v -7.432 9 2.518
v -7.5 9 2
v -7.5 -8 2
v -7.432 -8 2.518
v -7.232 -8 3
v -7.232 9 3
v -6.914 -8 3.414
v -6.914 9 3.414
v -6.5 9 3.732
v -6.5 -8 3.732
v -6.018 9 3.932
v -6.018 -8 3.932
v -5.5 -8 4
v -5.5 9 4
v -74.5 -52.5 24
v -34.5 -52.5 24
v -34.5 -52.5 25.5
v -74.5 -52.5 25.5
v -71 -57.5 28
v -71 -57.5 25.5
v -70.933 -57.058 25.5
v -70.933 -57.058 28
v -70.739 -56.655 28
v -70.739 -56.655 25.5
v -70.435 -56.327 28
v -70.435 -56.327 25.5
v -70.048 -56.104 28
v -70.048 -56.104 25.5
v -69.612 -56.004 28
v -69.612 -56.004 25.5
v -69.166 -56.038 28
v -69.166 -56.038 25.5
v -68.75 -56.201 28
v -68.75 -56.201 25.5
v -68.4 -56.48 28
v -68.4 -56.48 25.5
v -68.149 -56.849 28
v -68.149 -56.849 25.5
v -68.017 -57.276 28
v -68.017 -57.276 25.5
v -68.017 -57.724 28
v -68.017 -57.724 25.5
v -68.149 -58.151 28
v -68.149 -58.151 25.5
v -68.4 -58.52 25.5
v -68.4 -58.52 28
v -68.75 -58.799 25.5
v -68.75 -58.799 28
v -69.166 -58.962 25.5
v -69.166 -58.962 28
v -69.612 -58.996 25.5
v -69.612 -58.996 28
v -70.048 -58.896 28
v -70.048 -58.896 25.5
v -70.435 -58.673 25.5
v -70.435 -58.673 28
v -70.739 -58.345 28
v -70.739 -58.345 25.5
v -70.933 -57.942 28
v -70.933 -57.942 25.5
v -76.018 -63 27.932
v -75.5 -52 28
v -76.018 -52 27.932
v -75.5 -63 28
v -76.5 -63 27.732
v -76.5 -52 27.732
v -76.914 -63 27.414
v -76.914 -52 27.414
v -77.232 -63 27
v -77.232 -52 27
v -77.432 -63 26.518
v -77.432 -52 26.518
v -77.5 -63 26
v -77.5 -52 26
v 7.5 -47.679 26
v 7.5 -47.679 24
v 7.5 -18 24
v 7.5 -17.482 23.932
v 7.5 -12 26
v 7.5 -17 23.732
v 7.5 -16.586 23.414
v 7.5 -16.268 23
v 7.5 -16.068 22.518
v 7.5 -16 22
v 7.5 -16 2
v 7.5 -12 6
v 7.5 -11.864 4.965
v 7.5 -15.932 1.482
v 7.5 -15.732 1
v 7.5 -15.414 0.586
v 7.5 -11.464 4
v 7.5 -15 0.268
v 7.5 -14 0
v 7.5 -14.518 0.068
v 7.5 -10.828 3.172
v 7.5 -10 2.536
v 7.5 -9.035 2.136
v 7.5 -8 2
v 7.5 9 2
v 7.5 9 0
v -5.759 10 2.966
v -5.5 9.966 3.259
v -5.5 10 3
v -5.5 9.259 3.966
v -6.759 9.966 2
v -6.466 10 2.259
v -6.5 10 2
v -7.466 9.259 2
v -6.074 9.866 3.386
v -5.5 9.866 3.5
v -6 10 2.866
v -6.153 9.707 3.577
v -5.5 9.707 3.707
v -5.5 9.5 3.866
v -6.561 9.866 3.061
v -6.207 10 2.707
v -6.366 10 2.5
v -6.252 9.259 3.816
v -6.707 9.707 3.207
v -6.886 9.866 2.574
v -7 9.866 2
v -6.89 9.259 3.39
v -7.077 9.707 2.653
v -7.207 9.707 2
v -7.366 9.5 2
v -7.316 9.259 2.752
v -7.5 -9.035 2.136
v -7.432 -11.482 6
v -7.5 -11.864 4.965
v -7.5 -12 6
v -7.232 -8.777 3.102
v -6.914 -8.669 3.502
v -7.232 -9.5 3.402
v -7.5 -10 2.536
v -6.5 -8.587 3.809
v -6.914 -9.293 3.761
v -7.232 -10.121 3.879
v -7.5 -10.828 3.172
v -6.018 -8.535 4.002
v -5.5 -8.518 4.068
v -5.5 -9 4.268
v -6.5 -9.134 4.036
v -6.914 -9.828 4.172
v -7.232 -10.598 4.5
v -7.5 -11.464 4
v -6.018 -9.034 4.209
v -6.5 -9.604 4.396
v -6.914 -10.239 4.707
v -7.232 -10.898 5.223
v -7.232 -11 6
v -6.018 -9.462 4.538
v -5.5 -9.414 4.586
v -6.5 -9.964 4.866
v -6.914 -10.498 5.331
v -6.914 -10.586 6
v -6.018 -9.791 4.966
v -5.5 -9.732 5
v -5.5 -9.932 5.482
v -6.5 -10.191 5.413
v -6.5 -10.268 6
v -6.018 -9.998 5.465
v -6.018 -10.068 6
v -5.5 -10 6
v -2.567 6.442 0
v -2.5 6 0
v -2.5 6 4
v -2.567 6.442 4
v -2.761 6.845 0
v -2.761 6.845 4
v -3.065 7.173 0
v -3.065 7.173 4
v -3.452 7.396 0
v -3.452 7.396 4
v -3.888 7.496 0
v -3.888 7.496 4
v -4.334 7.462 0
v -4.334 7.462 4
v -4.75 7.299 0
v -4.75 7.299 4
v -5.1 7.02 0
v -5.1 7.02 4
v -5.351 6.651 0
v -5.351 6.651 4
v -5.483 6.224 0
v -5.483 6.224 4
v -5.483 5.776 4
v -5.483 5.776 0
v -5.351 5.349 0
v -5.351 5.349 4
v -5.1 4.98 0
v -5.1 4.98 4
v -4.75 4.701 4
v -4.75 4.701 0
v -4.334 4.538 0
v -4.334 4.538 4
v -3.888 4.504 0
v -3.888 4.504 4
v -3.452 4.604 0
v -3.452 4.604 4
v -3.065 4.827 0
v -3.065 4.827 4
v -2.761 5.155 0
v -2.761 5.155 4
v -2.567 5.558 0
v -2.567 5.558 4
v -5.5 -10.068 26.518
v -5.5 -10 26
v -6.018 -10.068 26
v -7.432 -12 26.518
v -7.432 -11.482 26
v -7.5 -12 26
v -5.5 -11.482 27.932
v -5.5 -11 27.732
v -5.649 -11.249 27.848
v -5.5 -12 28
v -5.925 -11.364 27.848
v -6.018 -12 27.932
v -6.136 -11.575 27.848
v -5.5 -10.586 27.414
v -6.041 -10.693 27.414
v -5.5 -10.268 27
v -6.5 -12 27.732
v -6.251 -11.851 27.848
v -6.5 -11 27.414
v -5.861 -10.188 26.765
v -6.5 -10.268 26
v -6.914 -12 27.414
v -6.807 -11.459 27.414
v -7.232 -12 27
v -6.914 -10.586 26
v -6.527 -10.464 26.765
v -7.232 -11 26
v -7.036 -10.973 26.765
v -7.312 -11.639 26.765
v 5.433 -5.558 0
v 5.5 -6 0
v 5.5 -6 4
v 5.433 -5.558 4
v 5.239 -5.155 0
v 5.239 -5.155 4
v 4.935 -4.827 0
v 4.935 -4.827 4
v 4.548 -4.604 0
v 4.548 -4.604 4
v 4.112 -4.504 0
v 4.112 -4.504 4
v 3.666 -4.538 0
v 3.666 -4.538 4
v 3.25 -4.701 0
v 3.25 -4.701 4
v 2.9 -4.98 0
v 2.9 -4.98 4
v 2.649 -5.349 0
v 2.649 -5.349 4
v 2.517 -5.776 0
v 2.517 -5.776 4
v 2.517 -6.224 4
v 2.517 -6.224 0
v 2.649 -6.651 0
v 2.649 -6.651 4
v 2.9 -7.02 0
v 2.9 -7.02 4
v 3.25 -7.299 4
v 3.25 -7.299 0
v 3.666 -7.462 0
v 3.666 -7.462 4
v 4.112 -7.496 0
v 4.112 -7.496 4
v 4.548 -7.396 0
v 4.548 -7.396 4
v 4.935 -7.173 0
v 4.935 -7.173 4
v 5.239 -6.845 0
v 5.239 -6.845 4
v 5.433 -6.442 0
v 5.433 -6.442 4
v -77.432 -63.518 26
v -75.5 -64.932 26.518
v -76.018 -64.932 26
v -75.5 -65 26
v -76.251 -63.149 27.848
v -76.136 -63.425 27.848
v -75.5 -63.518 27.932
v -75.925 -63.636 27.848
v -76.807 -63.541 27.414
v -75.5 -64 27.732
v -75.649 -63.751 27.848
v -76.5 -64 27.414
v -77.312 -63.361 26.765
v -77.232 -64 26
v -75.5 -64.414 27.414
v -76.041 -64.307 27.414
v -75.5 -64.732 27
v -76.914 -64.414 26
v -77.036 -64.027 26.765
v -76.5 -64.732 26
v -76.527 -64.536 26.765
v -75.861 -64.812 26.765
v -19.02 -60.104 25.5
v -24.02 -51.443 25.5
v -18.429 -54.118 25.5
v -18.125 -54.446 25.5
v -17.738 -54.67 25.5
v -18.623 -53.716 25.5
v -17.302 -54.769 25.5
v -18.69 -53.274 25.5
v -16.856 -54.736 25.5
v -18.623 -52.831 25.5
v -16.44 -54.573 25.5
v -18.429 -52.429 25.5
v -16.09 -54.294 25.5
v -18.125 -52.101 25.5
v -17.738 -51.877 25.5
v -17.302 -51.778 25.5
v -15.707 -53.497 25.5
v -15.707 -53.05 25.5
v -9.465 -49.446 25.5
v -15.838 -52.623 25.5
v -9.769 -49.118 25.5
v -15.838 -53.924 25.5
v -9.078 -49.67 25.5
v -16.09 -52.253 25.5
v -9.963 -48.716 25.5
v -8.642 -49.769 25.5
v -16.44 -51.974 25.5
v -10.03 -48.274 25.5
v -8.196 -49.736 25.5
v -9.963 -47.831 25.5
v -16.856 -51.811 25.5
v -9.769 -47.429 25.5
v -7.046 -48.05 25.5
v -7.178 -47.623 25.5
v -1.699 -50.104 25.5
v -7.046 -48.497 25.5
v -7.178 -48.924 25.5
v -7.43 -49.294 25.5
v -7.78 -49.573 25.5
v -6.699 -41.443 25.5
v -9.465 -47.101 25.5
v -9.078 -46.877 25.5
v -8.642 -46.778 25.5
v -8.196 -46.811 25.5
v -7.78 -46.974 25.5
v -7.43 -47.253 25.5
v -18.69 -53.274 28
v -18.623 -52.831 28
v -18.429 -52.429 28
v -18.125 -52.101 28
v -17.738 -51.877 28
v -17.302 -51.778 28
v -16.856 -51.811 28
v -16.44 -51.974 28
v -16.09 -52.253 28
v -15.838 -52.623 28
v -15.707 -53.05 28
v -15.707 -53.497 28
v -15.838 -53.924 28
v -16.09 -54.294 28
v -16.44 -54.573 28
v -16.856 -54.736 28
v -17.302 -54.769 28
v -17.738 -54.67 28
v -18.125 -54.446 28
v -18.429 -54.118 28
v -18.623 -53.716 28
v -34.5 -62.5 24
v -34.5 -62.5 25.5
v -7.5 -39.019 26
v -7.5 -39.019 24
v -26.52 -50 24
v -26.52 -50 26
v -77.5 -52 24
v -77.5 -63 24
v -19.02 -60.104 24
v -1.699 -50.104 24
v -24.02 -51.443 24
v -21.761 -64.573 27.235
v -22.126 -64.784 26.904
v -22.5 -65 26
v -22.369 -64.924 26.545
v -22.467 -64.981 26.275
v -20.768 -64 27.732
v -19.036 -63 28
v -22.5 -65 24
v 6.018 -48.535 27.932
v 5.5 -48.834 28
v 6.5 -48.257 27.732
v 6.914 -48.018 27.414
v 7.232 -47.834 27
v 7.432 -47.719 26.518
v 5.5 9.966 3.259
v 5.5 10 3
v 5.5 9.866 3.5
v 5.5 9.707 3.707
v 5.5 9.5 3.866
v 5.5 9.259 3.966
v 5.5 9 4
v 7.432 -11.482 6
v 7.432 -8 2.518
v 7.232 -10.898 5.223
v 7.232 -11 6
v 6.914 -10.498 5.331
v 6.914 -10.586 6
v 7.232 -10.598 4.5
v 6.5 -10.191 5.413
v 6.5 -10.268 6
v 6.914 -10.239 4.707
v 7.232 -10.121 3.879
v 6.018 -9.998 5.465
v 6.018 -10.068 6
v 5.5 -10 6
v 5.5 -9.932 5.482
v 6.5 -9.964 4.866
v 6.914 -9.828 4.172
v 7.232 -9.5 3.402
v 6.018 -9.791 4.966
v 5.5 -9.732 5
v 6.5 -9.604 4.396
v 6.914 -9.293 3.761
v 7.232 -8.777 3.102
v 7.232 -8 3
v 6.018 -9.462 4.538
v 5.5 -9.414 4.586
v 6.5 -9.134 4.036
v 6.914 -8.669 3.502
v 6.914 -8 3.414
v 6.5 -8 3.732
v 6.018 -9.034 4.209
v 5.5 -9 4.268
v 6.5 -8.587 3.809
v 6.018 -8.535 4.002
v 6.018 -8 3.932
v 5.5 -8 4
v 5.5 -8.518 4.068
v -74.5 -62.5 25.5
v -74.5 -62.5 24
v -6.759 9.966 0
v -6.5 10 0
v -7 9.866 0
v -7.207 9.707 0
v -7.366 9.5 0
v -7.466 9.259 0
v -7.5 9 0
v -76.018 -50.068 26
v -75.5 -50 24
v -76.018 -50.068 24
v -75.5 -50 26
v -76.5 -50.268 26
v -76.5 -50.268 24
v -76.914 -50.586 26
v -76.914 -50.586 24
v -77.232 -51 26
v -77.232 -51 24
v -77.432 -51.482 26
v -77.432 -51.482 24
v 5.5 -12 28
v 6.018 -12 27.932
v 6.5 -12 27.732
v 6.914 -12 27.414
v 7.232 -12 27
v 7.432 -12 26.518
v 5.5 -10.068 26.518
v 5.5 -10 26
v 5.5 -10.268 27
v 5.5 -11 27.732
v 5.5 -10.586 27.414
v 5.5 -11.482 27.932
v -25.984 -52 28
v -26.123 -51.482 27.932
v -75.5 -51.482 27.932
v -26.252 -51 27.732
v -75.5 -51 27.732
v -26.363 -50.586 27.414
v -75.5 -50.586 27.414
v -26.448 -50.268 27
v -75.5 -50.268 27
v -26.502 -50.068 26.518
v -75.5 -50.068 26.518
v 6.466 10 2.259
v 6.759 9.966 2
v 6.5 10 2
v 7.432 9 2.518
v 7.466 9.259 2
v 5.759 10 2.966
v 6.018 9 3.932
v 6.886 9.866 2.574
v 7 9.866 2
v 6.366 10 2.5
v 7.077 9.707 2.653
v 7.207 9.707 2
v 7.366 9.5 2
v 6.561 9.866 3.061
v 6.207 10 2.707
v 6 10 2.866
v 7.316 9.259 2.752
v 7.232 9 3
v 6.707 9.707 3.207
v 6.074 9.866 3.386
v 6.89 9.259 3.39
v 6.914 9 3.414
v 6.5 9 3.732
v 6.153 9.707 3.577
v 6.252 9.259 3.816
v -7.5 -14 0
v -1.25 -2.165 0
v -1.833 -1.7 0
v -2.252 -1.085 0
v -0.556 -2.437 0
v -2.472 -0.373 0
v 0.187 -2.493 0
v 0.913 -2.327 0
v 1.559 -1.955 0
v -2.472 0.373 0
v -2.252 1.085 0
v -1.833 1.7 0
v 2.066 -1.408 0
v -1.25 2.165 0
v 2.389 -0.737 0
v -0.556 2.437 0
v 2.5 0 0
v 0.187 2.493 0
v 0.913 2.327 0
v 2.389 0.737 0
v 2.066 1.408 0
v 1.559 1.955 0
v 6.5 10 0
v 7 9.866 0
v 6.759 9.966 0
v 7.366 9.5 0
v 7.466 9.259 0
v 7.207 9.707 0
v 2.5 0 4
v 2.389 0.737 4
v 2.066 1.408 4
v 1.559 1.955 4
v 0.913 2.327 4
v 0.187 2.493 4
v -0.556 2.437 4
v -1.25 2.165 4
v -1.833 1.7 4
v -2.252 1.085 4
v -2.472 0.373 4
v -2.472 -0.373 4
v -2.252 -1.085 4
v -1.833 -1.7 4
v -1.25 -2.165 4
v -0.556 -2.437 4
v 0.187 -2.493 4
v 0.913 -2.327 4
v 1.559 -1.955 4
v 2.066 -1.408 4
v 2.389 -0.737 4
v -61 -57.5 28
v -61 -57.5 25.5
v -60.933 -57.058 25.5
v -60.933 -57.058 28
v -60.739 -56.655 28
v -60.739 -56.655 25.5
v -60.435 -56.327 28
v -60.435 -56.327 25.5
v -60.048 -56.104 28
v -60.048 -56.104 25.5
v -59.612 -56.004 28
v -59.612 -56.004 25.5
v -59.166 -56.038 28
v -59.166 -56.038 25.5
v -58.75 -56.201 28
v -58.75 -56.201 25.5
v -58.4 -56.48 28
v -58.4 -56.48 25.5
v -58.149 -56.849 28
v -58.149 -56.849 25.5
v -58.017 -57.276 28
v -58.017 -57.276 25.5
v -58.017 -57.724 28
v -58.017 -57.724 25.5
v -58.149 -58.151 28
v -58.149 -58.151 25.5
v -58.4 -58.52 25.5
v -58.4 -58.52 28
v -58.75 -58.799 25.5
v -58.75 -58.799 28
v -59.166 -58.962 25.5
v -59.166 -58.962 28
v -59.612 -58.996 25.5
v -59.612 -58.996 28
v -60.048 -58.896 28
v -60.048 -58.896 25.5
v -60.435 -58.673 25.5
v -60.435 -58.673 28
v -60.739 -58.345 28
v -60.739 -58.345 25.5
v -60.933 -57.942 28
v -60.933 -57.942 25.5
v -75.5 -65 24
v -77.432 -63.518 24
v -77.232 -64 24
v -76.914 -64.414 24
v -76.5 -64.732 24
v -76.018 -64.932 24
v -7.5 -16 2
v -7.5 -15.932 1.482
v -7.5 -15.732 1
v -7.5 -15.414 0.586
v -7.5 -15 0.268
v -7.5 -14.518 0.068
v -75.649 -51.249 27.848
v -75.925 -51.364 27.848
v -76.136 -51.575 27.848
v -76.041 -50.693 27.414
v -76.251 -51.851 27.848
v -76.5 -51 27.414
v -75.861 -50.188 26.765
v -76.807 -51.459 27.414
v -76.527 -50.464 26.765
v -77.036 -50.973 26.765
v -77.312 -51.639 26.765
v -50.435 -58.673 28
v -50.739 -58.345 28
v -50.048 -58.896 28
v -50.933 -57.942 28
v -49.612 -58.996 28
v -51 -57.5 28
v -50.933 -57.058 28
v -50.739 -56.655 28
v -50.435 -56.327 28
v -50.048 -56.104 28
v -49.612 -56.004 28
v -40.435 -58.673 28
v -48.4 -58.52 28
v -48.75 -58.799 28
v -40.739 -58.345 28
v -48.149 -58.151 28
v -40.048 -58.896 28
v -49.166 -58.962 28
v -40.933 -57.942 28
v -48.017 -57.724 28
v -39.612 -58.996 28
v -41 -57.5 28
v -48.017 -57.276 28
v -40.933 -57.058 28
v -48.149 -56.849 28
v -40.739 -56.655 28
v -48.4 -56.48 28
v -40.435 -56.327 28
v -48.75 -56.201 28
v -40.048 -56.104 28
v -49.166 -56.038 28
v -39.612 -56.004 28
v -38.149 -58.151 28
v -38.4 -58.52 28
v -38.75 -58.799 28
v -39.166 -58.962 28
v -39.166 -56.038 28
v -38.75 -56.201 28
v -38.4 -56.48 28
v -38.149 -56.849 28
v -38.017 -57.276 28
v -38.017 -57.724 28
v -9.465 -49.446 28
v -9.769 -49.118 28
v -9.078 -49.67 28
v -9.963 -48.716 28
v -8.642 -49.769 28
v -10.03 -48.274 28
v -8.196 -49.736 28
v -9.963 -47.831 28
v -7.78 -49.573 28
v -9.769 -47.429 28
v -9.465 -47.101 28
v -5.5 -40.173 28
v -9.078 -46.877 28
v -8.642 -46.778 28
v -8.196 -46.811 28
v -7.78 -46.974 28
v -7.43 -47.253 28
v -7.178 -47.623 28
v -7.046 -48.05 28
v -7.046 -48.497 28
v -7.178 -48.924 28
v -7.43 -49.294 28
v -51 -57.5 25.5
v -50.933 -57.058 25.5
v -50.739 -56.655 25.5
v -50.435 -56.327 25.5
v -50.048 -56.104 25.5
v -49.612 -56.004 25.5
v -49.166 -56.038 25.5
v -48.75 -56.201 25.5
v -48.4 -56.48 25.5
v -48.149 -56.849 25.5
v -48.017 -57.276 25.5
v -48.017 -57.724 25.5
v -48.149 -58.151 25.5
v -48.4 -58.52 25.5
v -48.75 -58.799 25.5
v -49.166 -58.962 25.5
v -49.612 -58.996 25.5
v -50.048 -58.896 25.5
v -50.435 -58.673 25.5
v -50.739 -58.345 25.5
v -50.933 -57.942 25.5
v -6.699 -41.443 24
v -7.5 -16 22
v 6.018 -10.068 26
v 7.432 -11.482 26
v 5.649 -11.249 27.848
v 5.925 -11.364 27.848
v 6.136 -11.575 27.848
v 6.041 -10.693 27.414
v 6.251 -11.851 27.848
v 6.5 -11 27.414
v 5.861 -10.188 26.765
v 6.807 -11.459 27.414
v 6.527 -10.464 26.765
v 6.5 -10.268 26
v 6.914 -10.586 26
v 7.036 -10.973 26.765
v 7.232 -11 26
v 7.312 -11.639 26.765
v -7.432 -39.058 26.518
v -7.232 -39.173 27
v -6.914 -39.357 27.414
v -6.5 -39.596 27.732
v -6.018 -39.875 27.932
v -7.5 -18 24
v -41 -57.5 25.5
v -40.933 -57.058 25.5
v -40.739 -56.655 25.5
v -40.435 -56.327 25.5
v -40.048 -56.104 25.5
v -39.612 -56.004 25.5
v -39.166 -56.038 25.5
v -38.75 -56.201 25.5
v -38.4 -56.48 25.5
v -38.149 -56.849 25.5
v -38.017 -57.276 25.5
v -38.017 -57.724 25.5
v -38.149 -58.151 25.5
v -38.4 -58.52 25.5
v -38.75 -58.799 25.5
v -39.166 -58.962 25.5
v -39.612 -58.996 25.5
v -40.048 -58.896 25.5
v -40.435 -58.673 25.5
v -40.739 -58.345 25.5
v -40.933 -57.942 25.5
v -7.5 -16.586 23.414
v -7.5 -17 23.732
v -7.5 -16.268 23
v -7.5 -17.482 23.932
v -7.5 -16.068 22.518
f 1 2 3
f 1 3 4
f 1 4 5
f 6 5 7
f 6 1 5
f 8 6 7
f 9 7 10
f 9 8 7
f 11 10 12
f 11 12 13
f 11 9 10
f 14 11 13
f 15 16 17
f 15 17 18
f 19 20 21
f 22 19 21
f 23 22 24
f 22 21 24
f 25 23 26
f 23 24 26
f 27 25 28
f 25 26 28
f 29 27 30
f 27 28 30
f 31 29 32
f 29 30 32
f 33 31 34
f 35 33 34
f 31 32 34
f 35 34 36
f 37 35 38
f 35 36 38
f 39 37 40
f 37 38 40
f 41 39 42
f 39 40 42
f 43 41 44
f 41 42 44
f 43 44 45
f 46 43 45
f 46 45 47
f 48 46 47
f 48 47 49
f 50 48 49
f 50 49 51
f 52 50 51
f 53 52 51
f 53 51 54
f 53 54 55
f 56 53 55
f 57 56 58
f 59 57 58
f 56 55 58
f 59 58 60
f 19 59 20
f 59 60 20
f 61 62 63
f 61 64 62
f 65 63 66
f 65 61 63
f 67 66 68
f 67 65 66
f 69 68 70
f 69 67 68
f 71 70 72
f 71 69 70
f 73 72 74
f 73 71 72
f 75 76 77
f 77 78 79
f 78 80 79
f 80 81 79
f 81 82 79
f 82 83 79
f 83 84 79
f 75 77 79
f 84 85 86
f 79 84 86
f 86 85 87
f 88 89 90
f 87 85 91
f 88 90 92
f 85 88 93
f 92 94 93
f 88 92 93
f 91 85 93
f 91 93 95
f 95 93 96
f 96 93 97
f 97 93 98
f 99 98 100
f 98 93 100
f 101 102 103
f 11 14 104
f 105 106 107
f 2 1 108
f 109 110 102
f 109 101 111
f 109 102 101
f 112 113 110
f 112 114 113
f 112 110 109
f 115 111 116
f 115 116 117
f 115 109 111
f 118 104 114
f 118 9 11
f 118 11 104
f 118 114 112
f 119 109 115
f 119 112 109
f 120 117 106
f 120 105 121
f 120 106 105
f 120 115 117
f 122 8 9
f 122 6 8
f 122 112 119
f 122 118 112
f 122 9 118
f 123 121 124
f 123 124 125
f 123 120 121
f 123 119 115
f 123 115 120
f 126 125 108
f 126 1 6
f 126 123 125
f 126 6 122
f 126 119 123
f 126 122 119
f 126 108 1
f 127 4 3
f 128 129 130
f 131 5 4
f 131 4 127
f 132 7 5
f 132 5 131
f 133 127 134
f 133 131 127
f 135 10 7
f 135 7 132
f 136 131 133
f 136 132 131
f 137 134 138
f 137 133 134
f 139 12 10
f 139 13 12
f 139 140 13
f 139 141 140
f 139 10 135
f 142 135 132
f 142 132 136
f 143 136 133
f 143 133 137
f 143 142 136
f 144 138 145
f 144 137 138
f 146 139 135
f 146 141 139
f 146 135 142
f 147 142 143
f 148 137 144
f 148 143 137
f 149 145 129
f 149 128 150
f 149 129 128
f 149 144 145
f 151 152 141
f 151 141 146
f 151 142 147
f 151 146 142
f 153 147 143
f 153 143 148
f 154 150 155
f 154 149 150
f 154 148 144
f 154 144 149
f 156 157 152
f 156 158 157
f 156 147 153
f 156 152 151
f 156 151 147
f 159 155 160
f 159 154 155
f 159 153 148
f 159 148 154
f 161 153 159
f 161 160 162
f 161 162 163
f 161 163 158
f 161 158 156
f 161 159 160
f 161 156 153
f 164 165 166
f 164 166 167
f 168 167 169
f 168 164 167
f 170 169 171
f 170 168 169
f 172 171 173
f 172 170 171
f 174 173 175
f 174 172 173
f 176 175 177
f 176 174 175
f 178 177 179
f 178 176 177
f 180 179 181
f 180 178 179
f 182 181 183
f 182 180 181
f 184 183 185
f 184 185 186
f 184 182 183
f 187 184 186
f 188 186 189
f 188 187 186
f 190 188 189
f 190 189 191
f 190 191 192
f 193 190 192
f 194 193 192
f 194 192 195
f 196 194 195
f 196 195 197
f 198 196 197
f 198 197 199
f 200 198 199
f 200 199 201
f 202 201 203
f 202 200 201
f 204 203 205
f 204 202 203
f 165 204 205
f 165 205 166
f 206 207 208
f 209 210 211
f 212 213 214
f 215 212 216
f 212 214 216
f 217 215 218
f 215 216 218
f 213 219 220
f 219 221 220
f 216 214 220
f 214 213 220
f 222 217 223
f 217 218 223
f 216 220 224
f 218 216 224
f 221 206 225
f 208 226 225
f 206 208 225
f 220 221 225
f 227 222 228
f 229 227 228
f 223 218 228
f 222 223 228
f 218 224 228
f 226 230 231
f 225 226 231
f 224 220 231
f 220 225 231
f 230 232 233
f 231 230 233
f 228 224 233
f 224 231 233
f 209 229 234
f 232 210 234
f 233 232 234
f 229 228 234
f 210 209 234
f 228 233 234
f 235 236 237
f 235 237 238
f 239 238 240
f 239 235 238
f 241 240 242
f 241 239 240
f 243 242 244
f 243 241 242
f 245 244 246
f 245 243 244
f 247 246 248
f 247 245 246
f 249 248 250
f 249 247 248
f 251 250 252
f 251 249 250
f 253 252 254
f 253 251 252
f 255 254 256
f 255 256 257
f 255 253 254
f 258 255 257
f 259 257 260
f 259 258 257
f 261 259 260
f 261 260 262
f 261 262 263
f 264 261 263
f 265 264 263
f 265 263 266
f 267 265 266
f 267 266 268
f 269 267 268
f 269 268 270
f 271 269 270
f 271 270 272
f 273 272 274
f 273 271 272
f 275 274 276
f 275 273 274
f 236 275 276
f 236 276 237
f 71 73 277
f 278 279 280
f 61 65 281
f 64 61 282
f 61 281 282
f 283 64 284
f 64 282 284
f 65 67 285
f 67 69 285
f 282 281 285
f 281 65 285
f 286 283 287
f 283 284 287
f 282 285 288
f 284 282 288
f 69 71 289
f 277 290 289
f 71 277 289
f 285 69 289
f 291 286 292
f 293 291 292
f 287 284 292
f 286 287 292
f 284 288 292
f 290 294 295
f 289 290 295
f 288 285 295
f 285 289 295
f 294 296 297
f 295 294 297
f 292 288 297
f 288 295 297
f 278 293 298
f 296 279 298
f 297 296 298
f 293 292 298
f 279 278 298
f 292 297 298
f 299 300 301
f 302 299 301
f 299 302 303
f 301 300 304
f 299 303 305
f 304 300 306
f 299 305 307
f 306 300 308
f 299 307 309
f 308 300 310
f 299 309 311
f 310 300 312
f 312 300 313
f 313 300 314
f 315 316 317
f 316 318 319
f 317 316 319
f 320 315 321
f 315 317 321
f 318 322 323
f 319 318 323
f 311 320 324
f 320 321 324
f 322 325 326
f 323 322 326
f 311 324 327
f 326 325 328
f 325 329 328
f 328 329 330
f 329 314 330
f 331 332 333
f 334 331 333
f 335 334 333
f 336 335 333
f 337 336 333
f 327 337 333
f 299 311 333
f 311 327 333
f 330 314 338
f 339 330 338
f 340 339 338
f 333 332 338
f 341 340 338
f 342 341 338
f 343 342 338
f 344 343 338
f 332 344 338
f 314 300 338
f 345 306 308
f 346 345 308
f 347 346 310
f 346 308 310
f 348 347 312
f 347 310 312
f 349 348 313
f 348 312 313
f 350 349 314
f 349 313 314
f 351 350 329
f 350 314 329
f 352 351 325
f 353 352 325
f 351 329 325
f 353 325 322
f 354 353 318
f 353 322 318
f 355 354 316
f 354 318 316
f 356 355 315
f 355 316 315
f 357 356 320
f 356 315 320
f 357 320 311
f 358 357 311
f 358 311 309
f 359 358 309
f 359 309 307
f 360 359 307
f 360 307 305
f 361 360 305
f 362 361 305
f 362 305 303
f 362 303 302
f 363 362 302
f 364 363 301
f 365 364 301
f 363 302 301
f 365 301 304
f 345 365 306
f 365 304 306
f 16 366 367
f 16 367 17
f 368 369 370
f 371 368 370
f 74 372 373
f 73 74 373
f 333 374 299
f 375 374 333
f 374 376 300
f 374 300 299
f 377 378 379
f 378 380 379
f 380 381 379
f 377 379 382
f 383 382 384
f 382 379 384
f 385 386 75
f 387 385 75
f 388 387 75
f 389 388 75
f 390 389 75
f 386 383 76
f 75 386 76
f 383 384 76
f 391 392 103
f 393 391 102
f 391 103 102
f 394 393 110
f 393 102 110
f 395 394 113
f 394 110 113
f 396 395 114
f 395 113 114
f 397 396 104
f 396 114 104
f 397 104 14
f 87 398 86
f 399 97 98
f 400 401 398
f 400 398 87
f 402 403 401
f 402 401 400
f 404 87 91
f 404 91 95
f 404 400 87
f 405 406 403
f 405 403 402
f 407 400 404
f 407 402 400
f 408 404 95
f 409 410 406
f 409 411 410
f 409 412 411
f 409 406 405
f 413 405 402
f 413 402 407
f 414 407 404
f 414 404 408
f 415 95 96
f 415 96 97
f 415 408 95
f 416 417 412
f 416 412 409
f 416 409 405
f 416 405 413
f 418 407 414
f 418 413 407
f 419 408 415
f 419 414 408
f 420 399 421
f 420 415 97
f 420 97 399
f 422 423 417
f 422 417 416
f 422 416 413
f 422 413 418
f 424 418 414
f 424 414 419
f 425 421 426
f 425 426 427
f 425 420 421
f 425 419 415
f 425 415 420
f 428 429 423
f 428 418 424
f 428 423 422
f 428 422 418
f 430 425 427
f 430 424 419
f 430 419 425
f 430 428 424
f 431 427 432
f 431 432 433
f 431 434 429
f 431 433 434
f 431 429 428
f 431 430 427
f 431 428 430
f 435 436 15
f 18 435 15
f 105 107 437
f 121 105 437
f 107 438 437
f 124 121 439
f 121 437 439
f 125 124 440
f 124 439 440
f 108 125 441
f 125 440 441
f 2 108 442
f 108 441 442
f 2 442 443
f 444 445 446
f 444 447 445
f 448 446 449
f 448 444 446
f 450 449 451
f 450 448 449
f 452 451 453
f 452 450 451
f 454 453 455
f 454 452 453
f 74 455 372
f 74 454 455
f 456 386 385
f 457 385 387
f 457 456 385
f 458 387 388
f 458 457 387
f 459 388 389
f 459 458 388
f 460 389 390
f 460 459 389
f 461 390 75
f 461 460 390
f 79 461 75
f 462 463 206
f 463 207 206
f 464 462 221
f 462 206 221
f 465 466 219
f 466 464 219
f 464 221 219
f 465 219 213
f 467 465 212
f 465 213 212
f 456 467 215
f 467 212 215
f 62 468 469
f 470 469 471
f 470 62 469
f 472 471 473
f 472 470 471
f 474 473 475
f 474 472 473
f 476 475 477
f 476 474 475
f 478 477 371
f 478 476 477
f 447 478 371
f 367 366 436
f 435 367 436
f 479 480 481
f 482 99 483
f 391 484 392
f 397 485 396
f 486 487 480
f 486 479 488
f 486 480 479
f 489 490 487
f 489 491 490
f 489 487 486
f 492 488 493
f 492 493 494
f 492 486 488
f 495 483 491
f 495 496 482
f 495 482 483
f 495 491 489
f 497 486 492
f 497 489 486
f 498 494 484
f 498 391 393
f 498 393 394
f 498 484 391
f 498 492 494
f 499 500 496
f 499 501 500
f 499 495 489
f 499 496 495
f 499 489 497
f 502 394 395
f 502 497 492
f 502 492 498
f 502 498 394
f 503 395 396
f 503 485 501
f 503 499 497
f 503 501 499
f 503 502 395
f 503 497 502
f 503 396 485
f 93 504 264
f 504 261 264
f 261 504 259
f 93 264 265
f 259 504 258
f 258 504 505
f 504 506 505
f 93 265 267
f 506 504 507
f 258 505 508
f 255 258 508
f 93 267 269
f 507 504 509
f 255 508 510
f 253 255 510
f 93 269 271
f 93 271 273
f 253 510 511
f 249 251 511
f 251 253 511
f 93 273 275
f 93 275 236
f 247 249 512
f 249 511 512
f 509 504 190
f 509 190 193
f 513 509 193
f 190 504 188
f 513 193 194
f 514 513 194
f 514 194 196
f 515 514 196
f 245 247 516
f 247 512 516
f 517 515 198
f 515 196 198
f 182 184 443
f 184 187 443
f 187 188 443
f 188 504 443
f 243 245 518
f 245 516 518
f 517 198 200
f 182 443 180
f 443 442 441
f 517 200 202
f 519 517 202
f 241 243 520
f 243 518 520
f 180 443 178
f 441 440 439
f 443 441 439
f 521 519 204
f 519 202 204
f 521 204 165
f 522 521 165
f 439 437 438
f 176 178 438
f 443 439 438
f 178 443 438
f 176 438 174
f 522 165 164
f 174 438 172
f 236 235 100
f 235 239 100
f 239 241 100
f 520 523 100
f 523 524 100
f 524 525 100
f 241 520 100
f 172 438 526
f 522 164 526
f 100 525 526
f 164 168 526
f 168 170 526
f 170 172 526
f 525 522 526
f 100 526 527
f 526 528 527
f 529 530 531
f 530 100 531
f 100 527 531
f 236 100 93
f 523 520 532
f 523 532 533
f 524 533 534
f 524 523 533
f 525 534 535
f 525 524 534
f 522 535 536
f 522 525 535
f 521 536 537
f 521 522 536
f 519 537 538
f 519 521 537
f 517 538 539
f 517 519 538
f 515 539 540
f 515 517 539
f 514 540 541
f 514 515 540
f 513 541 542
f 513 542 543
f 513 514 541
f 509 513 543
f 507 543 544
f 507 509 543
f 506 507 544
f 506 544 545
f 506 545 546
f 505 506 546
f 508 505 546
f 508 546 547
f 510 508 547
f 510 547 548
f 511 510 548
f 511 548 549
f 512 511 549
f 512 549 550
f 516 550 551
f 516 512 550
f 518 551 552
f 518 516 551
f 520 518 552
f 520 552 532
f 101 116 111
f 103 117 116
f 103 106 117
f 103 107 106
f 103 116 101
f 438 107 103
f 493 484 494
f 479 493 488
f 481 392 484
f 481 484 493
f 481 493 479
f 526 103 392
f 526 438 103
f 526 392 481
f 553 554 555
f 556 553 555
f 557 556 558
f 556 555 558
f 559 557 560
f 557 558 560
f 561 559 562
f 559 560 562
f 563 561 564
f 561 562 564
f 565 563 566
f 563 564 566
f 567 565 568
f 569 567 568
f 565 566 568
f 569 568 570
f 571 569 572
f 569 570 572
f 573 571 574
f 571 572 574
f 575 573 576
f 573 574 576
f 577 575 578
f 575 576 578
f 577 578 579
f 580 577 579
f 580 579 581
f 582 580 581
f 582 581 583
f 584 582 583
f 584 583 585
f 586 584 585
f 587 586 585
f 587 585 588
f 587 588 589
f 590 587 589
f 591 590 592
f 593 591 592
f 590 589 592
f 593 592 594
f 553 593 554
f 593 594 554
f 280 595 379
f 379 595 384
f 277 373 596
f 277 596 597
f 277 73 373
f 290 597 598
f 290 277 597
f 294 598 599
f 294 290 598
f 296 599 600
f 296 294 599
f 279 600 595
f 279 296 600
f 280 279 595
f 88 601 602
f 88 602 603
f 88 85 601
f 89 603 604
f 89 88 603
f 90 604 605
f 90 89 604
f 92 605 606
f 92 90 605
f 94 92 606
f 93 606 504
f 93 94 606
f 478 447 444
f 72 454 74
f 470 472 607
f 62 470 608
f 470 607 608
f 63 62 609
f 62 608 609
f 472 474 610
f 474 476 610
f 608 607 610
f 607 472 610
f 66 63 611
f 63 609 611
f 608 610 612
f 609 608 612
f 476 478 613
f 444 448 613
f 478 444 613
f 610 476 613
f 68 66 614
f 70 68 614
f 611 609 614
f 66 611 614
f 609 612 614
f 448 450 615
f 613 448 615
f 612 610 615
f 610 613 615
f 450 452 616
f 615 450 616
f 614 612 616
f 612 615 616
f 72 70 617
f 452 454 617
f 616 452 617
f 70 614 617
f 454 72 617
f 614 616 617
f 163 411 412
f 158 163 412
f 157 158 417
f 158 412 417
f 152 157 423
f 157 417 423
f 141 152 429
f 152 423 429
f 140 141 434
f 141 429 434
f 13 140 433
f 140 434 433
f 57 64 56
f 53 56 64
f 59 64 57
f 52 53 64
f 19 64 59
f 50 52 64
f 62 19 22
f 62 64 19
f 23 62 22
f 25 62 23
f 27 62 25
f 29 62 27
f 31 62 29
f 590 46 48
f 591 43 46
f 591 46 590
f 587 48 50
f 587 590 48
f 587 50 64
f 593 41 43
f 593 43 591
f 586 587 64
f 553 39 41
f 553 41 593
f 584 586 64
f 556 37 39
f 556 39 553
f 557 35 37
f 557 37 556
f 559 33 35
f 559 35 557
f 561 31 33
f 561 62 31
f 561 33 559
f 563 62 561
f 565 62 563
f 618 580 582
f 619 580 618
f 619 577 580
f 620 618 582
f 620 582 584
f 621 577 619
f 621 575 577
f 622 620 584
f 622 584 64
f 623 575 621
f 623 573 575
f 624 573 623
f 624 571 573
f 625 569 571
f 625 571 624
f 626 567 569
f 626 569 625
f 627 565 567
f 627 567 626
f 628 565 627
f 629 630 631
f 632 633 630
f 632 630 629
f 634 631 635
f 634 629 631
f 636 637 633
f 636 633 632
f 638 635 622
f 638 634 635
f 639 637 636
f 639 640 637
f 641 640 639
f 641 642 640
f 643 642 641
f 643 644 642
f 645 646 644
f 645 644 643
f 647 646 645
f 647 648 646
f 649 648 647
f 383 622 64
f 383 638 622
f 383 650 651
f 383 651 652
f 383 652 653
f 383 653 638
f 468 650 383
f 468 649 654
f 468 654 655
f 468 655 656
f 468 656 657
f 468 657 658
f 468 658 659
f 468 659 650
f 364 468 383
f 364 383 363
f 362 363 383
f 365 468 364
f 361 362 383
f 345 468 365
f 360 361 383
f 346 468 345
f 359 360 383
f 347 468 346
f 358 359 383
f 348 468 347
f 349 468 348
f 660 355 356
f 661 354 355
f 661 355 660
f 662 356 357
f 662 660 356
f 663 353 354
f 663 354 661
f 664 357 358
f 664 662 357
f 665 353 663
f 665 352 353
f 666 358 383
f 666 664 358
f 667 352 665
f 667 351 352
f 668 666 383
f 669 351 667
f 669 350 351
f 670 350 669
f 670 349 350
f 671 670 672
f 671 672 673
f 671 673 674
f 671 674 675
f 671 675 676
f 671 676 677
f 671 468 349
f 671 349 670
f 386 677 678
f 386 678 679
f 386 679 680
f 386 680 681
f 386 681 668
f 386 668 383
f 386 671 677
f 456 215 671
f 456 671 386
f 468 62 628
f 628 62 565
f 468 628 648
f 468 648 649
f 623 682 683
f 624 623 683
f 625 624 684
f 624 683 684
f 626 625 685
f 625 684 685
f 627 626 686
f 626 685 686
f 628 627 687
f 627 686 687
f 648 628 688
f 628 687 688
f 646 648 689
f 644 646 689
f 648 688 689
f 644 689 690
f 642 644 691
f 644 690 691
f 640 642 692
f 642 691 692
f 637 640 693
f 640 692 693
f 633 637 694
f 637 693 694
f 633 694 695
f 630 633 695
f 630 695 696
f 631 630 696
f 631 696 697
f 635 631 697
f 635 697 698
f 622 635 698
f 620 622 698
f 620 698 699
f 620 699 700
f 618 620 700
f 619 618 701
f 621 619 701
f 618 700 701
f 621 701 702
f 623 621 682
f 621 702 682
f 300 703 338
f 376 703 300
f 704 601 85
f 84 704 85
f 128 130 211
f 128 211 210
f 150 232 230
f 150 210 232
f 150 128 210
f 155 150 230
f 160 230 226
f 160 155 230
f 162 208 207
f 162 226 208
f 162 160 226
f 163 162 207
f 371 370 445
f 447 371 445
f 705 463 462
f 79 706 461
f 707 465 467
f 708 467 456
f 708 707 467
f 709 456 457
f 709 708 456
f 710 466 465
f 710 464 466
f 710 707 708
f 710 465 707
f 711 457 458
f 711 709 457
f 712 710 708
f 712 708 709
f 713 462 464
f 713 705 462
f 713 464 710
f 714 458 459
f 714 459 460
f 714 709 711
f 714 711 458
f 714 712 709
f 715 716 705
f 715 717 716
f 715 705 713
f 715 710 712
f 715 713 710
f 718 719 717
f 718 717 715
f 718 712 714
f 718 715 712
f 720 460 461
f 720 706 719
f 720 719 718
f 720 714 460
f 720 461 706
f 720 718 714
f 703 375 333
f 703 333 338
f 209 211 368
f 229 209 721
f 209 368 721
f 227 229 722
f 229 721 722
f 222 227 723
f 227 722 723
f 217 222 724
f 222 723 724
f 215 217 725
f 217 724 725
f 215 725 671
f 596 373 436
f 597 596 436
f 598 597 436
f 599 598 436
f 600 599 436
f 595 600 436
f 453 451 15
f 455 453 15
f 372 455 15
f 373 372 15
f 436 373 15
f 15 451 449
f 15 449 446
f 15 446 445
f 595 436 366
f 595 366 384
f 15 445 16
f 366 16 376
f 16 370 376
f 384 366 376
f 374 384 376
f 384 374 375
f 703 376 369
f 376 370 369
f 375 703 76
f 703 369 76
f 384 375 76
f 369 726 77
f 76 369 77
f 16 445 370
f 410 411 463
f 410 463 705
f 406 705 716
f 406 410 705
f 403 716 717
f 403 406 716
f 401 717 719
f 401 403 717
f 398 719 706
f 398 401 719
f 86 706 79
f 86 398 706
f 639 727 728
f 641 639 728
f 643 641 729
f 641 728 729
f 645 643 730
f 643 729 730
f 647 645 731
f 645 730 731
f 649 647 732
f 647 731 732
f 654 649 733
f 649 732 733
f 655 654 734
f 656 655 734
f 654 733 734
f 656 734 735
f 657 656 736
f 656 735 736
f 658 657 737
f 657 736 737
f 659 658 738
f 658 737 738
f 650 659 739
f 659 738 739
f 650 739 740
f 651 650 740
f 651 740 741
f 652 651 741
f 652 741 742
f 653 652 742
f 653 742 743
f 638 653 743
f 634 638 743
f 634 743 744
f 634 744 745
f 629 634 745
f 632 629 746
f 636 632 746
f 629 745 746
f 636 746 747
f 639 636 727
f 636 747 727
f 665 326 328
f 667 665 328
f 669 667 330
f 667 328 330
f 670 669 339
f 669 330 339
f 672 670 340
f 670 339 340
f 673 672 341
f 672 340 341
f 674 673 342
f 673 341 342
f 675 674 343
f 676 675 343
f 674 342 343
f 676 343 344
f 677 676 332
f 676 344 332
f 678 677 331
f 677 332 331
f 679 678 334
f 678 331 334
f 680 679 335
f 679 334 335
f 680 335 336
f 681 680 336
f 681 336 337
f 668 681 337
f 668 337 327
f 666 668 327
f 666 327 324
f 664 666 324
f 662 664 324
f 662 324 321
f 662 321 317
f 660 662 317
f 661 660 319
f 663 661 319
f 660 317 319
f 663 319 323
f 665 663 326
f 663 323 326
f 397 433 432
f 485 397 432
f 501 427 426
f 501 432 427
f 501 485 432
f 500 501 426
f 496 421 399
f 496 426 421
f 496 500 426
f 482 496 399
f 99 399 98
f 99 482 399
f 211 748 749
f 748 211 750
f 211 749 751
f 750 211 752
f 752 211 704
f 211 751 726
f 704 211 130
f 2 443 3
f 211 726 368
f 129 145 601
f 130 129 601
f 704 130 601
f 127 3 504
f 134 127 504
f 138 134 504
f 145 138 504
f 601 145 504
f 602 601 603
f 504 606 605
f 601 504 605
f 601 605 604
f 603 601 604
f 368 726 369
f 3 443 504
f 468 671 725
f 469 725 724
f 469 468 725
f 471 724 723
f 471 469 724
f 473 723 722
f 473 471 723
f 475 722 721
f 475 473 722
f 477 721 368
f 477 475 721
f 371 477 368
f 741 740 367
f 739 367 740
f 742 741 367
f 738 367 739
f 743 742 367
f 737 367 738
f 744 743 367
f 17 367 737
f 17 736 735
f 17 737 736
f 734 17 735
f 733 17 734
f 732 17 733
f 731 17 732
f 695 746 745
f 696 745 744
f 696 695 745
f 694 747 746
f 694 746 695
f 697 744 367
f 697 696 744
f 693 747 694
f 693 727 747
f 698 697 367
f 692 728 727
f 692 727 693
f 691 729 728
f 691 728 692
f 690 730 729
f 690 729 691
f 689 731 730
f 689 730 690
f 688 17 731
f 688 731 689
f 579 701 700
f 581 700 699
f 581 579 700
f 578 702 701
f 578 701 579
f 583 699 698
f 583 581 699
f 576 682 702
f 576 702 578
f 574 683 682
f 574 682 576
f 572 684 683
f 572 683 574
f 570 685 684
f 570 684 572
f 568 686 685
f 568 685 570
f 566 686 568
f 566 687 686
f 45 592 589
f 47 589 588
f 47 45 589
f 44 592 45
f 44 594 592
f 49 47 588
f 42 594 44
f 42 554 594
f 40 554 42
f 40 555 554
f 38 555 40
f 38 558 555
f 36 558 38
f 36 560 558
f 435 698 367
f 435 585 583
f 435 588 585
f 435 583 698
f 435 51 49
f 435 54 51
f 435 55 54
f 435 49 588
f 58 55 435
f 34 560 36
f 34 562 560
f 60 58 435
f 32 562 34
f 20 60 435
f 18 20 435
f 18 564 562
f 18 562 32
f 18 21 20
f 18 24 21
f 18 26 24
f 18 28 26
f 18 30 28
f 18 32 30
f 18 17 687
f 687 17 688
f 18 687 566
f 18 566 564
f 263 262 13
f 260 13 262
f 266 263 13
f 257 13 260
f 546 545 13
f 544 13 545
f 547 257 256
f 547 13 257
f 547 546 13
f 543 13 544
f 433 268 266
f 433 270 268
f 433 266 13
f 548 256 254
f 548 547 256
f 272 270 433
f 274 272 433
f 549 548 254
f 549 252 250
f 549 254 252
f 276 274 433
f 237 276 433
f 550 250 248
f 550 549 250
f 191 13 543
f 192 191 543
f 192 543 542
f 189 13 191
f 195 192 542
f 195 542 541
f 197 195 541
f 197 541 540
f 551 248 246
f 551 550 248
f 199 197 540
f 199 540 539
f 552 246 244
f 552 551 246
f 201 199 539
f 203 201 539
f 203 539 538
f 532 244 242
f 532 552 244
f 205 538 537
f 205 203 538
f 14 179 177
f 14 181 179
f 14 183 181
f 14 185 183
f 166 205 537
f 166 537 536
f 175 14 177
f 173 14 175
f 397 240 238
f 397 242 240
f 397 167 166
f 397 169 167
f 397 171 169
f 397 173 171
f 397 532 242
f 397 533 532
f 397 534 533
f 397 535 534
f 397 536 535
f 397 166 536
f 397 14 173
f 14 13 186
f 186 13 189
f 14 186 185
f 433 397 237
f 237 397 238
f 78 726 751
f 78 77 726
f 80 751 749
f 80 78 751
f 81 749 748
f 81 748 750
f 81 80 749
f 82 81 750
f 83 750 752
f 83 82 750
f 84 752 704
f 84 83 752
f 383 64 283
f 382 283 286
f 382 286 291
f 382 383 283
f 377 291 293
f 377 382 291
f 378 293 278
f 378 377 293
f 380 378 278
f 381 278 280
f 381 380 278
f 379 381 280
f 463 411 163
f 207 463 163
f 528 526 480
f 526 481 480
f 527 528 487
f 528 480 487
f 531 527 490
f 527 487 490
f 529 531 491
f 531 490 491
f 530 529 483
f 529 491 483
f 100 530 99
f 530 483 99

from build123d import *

# Parameters (mm, degrees)
SKETCH_1_W          = 15
SKETCH_1_H          = 26
SKETCH_1_R          = 2.5
SKETCH_1_R_2        = 1.5
EXTRUDE_1_DEPTH     = 4
SKETCH_14_W         = 15
SKETCH_14_H         = 6
EXTRUDE_4_DEPTH     = 20
EXTRUDE_5_DEPTH     = 4
SKETCH_17_W         = 40
SKETCH_17_H         = 10
CUT_EXTRUDE_3_DEPTH = 1.5
SKETCH_18_R         = 1.5
CUT_EXTRUDE_4_DEPTH = 2.5
CUT_EXTRUDE_5_DEPTH = 1.5
SKETCH_20_R         = 1.5
CUT_EXTRUDE_6_DEPTH = 2.5
FILLET_1_R          = 2
FILLET_2_R          = 1


with BuildPart() as part:
    # 草图1 → 凸台-拉伸1 (new body)
    with BuildSketch(Plane.XY):
        with Locations((0, -3)):
            Rectangle(SKETCH_1_W, SKETCH_1_H)
        Circle(SKETCH_1_R, mode=Mode.SUBTRACT)
        with Locations((-4, 6)):
            Circle(SKETCH_1_R_2, mode=Mode.SUBTRACT)
        with Locations((4, -6)):
            Circle(SKETCH_1_R_2, mode=Mode.SUBTRACT)
    extrude(amount=EXTRUDE_1_DEPTH)

    # 草图14 → 凸台-拉伸4 (add)
    with BuildSketch(Plane.XY.offset(4)):
        with Locations((0, -13)):
            Rectangle(SKETCH_14_W, SKETCH_14_H)
    extrude(amount=EXTRUDE_4_DEPTH)

    # 草图15 → 凸台-拉伸5 (add)
    with BuildSketch(Plane.XY.offset(24)):
        Polygon((-7.5, -10), (-7.5, -39.01879788), (-26.52, -50), (-77.5, -50), (-77.5, -65), (-22.5, -65), (7.5, -47.679491924), (7.5, -10), align=None)
    extrude(amount=EXTRUDE_5_DEPTH)

    # 草图17 → 切除-拉伸3 (cut)
    with BuildSketch(Plane(origin=(0, 0, 24), x_dir=(-1, 0, 0), z_dir=(0, 0, -1))):
        with Locations((54.5, -57.5)):
            Rectangle(SKETCH_17_W, SKETCH_17_H)
    extrude(amount=-CUT_EXTRUDE_3_DEPTH, mode=Mode.SUBTRACT)

    # 草图18 → 切除-拉伸4 (cut)
    with BuildSketch(Plane(origin=(0, 0, 25.5), x_dir=(-1, 0, 0), z_dir=(0, 0, -1))):
        with Locations((39.5, -57.5)):
            Circle(SKETCH_18_R)
        with Locations((49.5, -57.5)):
            Circle(SKETCH_18_R)
        with Locations((59.5, -57.5)):
            Circle(SKETCH_18_R)
        with Locations((69.5, -57.5)):
            Circle(SKETCH_18_R)
    extrude(amount=-CUT_EXTRUDE_4_DEPTH, mode=Mode.SUBTRACT)

    # 草图19 → 切除-拉伸5 (cut)
    with BuildSketch(Plane(origin=(0, 0, 24), x_dir=(-1, 0, 0), z_dir=(0, 0, -1))):
        Polygon((6.699491924, -41.443375673), (24.02, -51.443375673), (19.02, -60.103629711), (1.699491924, -50.103629711), align=None)
    extrude(amount=-CUT_EXTRUDE_5_DEPTH, mode=Mode.SUBTRACT)

    # 草图20 → 切除-拉伸6 (cut)
    with BuildSketch(Plane(origin=(0, 0, 25.5), x_dir=(-1, 0, 0), z_dir=(0, 0, -1))):
        with Locations((8.529618943, -48.273502692)):
            Circle(SKETCH_20_R)
        with Locations((17.189872981, -53.273502692)):
            Circle(SKETCH_20_R)
    extrude(amount=-CUT_EXTRUDE_6_DEPTH, mode=Mode.SUBTRACT)

    # 圆角1
    fillet_1_edges = [part.edges().sort_by_distance(p)[0] for p in [
        (-7.5, 0, 4),
        (7.5, 0, 4),
        (-7.5, -10, 16),
        (0, -10, 4),
        (7.5, -10, 16),
        (0, -16, 24),
        (-77.5, -50, 26),
        (-77.5, -65, 26),
        (0, -10, 28),
        (-7.5, -24.50939894, 28),
        (-17.01, -44.50939894, 28),
        (-52.01, -50, 28),
        (-77.5, -57.5, 28),
        (-50, -65, 28),
        (7.5, -28.839745962, 28),
        (0, -16, 0),
    ]]
    fillet(fillet_1_edges, radius=FILLET_1_R - 0.0001)  # a hair under: the kernel refuses the full size

    # 圆角2
    fillet_2_edges = [part.edges().sort_by_distance(p)[0] for p in [
        (7.5, 10, 1.00005),
        (-7.5, 10, 1.00005),
        (0, 10, 4),
        (-6.914242852, 10, 3.414242852),
        (6.914242852, 10, 3.414242852),
    ]]
    fillet(fillet_2_edges, radius=FILLET_2_R)


solid = part.part
